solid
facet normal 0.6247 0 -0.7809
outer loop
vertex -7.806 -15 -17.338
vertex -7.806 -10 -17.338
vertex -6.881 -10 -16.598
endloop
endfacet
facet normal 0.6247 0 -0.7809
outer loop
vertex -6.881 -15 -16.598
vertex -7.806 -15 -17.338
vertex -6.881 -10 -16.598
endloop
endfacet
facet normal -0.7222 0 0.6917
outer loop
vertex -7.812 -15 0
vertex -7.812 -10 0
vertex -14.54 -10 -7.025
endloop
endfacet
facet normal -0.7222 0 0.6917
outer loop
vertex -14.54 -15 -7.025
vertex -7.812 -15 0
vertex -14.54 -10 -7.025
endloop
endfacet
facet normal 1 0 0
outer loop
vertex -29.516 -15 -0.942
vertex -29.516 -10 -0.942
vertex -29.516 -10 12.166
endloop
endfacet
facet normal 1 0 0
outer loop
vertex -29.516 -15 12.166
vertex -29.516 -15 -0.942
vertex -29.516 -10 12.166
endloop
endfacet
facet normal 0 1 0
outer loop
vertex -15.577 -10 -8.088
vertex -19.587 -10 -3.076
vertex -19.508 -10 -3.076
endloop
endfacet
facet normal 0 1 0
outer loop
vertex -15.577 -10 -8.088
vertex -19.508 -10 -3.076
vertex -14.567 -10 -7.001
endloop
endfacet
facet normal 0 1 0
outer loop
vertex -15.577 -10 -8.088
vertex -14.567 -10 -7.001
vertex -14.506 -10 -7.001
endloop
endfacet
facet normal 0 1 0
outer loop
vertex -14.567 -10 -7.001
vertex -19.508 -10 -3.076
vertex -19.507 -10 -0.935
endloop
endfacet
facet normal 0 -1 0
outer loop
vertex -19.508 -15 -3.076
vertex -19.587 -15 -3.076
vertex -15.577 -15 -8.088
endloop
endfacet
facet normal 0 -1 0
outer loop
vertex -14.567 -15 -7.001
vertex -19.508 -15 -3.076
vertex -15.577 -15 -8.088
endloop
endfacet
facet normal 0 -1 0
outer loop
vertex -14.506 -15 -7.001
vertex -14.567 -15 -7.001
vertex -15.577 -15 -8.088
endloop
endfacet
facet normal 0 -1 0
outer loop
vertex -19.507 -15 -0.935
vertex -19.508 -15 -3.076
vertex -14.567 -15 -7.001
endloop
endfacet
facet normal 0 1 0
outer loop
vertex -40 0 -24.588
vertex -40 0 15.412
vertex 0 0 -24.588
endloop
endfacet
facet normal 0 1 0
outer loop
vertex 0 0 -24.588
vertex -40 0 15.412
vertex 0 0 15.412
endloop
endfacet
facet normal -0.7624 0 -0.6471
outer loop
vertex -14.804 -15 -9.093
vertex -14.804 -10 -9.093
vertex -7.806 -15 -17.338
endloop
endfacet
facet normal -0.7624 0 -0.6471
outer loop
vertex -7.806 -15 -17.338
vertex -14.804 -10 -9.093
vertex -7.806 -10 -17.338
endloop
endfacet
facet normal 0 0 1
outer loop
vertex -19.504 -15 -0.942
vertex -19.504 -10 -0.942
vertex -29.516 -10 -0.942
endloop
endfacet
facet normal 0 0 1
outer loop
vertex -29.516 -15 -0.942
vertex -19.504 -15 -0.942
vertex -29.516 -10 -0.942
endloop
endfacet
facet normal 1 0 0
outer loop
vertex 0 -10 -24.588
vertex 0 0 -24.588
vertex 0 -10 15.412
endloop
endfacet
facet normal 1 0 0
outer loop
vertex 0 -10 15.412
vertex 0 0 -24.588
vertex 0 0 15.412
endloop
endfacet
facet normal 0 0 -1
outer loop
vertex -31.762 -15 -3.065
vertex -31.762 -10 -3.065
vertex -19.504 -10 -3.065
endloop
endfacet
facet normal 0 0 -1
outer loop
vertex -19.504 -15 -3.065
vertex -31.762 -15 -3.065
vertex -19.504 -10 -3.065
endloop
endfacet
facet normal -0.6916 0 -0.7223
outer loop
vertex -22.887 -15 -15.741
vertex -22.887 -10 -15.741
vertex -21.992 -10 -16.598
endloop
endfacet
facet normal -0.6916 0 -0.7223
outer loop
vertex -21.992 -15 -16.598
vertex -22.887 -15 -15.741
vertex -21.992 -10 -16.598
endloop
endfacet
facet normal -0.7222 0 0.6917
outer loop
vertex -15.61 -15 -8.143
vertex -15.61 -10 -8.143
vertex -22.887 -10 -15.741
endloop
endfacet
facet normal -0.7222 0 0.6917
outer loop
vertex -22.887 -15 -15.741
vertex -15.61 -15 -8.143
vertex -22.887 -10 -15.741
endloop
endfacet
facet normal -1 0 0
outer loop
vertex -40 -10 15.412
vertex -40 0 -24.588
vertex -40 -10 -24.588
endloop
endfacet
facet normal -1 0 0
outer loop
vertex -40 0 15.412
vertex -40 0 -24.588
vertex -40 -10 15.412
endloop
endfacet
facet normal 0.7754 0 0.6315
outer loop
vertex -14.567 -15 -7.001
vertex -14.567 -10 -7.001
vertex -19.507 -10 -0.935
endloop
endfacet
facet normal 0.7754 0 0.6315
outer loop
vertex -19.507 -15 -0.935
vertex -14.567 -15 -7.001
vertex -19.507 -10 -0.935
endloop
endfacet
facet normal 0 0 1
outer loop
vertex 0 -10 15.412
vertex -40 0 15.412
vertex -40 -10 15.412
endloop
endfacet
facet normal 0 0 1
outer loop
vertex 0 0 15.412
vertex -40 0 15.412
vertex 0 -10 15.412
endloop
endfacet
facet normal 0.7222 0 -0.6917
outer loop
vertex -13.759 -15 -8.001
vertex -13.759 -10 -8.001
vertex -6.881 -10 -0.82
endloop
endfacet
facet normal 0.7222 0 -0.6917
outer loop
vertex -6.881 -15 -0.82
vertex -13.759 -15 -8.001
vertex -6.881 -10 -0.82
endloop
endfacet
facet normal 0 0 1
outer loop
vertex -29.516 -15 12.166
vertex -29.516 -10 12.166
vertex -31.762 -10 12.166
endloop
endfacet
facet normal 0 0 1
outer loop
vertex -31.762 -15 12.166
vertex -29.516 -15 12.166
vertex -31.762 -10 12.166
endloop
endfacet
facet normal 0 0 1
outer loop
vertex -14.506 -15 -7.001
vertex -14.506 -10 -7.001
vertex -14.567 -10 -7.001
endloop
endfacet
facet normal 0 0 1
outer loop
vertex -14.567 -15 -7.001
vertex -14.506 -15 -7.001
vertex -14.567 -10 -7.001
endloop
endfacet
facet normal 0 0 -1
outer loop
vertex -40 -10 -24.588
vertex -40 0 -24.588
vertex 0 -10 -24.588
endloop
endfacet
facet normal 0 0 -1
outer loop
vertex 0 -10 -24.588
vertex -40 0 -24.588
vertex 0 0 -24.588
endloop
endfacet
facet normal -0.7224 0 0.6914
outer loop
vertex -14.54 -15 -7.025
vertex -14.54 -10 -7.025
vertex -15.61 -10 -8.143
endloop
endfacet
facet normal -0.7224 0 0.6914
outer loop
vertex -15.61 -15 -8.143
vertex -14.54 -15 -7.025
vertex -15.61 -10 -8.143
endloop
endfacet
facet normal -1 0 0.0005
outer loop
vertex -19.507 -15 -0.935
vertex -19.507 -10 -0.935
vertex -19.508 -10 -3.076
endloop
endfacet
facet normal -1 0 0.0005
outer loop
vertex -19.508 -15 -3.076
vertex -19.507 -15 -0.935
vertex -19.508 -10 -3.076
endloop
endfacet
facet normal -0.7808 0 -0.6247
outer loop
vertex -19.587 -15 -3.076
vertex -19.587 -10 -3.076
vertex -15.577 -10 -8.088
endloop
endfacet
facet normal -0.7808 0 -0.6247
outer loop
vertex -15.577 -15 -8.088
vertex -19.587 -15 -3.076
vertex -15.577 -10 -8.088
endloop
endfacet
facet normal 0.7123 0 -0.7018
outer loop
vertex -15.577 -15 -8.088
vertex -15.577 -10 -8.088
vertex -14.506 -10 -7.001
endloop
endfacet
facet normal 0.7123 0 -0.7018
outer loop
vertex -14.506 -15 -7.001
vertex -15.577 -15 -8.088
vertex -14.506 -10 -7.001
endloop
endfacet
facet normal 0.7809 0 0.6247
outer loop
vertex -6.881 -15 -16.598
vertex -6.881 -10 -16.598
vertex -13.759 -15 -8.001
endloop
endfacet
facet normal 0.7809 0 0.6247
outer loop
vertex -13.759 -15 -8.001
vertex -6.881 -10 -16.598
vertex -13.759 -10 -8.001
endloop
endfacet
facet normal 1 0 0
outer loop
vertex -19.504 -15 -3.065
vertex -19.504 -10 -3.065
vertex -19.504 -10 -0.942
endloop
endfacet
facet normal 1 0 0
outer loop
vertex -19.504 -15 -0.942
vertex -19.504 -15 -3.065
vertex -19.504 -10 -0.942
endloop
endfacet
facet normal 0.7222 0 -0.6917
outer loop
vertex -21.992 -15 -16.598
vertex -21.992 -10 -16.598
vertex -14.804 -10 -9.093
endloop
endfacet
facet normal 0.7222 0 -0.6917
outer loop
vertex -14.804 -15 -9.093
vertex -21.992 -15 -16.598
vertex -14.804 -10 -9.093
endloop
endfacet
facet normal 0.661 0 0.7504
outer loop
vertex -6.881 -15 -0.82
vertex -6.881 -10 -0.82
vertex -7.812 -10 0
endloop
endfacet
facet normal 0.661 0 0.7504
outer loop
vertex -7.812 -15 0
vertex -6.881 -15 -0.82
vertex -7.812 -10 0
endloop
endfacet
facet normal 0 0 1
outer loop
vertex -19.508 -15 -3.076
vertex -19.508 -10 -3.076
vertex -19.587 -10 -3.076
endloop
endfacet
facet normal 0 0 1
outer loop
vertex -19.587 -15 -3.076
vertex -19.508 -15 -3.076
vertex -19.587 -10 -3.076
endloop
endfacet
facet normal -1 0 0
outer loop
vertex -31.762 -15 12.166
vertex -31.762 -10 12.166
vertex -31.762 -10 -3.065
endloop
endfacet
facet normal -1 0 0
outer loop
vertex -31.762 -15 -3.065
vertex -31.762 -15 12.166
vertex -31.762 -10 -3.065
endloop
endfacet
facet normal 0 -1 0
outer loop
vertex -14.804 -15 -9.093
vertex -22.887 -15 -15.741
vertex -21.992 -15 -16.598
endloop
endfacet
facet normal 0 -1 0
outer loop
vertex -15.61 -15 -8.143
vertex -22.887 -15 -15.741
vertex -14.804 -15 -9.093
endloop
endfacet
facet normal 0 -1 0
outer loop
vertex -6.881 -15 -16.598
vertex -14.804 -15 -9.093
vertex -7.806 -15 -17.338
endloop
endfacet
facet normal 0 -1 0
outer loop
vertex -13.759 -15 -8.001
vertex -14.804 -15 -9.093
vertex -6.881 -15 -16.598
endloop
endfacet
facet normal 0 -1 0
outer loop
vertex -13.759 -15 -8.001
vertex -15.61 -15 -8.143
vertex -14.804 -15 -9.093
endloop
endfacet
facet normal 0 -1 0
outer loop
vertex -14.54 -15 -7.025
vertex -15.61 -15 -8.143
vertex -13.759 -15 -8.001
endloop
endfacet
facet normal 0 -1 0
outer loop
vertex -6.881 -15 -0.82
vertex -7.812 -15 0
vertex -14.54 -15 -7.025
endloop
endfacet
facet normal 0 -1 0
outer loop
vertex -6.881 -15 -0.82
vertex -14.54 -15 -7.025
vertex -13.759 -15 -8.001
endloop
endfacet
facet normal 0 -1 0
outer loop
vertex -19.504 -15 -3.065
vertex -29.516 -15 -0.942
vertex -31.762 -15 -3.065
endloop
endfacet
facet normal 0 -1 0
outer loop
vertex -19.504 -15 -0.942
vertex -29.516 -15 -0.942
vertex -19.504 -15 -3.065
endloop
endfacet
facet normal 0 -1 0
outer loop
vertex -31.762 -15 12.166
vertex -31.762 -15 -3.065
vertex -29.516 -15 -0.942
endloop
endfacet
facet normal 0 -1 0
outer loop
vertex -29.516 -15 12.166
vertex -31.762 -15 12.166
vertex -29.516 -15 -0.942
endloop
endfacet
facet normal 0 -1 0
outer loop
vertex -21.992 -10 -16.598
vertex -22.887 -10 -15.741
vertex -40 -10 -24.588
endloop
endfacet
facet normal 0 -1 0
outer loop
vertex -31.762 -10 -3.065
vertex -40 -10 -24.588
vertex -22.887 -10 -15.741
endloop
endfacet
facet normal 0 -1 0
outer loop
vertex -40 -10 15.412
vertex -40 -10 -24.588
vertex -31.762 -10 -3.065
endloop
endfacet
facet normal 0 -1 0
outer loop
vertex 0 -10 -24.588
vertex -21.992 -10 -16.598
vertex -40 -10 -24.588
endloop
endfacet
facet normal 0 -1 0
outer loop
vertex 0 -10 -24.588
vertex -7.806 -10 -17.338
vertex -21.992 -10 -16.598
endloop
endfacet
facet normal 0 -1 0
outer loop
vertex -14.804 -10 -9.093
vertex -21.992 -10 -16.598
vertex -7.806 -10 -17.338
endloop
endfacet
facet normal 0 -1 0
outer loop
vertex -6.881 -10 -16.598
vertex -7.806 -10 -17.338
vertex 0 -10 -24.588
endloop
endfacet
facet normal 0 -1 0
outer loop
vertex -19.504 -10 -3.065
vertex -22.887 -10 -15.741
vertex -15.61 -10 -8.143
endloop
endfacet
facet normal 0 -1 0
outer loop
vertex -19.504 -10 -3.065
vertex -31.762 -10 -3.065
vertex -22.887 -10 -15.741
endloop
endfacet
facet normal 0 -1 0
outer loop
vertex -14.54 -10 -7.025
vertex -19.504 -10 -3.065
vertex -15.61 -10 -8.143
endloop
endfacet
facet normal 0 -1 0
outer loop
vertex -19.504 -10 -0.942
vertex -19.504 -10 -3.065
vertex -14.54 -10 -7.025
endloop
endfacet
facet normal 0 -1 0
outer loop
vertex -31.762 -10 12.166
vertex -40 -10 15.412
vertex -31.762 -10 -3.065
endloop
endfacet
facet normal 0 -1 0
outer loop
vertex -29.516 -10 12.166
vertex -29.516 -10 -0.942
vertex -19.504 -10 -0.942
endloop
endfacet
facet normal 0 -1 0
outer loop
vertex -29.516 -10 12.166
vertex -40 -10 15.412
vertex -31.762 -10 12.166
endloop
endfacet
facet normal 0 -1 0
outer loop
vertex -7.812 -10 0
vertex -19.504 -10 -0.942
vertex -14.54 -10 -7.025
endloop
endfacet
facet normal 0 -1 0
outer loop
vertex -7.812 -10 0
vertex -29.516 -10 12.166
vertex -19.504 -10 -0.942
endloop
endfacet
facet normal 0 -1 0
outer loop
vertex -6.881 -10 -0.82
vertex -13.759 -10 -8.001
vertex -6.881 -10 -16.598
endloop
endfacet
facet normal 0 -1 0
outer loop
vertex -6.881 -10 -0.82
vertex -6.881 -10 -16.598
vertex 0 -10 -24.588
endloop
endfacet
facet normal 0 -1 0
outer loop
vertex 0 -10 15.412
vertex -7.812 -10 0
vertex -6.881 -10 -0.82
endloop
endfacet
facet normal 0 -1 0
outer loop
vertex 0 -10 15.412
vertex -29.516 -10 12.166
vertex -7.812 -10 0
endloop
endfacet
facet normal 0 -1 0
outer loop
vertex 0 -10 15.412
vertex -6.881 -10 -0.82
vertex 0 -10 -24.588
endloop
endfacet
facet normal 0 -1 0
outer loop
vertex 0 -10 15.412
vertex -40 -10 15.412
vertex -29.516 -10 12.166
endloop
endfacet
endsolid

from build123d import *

# Parameters (mm, degrees)
F0_W     = 39.99992
F0_H     = 39.99992
F1_DEPTH = 10
F4_DEPTH = 5
F5_DEPTH = 5
F7_DEPTH = 5


with BuildPart() as f1:
    # F0 (on Front) → F1 (new body)
    with BuildSketch(Plane.XZ):
        with Locations((-19.99996, -4.587722)):
            Rectangle(F0_W, F0_H)
    extrude(amount=F1_DEPTH)

    # F2 (on face) → F4 (join)
    with BuildSketch(Plane.XZ.offset(10)):
        Polygon((-29.516464, 12.166237), (-31.761777, 12.166237), (-31.761777, -3.065485), (-19.50358, -3.065485), (-19.50358, -0.941539), (-29.516464, -0.941539), align=None)
    extrude(amount=F4_DEPTH)

    # F3 (on face) → F5 (join)
    with BuildSketch(Plane.XZ.offset(10)):
        Polygon((-7.812001, 0), (-14.53975, -7.024959), (-13.758637, -8.00135), (-6.881277, -0.820171), align=None)
        Polygon((-13.758637, -8.00135), (-14.53975, -7.024959), (-15.610237, -8.142737), (-14.803926, -9.092817), align=None)
        Polygon((-6.881277, -16.59805), (-13.758637, -8.00135), (-14.803926, -9.092817), (-7.80634, -17.3381), align=None)
        Polygon((-14.803926, -9.092817), (-15.610237, -8.142737), (-22.886798, -15.740753), (-21.991629, -16.59805), align=None)
    extrude(amount=F5_DEPTH)


with BuildPart() as f7:
    # F6 (on face) → F7 (new body)
    with BuildSketch(Plane.XZ.offset(10)):
        Polygon((-14.506066, -7.001007), (-14.566511, -7.001007), (-19.507125, -0.934796), (-19.507809, -3.076034), (-19.586561, -3.076034), (-15.576883, -8.088133), align=None)
    extrude(amount=F7_DEPTH)


solid = Compound([f1.part, f7.part])
